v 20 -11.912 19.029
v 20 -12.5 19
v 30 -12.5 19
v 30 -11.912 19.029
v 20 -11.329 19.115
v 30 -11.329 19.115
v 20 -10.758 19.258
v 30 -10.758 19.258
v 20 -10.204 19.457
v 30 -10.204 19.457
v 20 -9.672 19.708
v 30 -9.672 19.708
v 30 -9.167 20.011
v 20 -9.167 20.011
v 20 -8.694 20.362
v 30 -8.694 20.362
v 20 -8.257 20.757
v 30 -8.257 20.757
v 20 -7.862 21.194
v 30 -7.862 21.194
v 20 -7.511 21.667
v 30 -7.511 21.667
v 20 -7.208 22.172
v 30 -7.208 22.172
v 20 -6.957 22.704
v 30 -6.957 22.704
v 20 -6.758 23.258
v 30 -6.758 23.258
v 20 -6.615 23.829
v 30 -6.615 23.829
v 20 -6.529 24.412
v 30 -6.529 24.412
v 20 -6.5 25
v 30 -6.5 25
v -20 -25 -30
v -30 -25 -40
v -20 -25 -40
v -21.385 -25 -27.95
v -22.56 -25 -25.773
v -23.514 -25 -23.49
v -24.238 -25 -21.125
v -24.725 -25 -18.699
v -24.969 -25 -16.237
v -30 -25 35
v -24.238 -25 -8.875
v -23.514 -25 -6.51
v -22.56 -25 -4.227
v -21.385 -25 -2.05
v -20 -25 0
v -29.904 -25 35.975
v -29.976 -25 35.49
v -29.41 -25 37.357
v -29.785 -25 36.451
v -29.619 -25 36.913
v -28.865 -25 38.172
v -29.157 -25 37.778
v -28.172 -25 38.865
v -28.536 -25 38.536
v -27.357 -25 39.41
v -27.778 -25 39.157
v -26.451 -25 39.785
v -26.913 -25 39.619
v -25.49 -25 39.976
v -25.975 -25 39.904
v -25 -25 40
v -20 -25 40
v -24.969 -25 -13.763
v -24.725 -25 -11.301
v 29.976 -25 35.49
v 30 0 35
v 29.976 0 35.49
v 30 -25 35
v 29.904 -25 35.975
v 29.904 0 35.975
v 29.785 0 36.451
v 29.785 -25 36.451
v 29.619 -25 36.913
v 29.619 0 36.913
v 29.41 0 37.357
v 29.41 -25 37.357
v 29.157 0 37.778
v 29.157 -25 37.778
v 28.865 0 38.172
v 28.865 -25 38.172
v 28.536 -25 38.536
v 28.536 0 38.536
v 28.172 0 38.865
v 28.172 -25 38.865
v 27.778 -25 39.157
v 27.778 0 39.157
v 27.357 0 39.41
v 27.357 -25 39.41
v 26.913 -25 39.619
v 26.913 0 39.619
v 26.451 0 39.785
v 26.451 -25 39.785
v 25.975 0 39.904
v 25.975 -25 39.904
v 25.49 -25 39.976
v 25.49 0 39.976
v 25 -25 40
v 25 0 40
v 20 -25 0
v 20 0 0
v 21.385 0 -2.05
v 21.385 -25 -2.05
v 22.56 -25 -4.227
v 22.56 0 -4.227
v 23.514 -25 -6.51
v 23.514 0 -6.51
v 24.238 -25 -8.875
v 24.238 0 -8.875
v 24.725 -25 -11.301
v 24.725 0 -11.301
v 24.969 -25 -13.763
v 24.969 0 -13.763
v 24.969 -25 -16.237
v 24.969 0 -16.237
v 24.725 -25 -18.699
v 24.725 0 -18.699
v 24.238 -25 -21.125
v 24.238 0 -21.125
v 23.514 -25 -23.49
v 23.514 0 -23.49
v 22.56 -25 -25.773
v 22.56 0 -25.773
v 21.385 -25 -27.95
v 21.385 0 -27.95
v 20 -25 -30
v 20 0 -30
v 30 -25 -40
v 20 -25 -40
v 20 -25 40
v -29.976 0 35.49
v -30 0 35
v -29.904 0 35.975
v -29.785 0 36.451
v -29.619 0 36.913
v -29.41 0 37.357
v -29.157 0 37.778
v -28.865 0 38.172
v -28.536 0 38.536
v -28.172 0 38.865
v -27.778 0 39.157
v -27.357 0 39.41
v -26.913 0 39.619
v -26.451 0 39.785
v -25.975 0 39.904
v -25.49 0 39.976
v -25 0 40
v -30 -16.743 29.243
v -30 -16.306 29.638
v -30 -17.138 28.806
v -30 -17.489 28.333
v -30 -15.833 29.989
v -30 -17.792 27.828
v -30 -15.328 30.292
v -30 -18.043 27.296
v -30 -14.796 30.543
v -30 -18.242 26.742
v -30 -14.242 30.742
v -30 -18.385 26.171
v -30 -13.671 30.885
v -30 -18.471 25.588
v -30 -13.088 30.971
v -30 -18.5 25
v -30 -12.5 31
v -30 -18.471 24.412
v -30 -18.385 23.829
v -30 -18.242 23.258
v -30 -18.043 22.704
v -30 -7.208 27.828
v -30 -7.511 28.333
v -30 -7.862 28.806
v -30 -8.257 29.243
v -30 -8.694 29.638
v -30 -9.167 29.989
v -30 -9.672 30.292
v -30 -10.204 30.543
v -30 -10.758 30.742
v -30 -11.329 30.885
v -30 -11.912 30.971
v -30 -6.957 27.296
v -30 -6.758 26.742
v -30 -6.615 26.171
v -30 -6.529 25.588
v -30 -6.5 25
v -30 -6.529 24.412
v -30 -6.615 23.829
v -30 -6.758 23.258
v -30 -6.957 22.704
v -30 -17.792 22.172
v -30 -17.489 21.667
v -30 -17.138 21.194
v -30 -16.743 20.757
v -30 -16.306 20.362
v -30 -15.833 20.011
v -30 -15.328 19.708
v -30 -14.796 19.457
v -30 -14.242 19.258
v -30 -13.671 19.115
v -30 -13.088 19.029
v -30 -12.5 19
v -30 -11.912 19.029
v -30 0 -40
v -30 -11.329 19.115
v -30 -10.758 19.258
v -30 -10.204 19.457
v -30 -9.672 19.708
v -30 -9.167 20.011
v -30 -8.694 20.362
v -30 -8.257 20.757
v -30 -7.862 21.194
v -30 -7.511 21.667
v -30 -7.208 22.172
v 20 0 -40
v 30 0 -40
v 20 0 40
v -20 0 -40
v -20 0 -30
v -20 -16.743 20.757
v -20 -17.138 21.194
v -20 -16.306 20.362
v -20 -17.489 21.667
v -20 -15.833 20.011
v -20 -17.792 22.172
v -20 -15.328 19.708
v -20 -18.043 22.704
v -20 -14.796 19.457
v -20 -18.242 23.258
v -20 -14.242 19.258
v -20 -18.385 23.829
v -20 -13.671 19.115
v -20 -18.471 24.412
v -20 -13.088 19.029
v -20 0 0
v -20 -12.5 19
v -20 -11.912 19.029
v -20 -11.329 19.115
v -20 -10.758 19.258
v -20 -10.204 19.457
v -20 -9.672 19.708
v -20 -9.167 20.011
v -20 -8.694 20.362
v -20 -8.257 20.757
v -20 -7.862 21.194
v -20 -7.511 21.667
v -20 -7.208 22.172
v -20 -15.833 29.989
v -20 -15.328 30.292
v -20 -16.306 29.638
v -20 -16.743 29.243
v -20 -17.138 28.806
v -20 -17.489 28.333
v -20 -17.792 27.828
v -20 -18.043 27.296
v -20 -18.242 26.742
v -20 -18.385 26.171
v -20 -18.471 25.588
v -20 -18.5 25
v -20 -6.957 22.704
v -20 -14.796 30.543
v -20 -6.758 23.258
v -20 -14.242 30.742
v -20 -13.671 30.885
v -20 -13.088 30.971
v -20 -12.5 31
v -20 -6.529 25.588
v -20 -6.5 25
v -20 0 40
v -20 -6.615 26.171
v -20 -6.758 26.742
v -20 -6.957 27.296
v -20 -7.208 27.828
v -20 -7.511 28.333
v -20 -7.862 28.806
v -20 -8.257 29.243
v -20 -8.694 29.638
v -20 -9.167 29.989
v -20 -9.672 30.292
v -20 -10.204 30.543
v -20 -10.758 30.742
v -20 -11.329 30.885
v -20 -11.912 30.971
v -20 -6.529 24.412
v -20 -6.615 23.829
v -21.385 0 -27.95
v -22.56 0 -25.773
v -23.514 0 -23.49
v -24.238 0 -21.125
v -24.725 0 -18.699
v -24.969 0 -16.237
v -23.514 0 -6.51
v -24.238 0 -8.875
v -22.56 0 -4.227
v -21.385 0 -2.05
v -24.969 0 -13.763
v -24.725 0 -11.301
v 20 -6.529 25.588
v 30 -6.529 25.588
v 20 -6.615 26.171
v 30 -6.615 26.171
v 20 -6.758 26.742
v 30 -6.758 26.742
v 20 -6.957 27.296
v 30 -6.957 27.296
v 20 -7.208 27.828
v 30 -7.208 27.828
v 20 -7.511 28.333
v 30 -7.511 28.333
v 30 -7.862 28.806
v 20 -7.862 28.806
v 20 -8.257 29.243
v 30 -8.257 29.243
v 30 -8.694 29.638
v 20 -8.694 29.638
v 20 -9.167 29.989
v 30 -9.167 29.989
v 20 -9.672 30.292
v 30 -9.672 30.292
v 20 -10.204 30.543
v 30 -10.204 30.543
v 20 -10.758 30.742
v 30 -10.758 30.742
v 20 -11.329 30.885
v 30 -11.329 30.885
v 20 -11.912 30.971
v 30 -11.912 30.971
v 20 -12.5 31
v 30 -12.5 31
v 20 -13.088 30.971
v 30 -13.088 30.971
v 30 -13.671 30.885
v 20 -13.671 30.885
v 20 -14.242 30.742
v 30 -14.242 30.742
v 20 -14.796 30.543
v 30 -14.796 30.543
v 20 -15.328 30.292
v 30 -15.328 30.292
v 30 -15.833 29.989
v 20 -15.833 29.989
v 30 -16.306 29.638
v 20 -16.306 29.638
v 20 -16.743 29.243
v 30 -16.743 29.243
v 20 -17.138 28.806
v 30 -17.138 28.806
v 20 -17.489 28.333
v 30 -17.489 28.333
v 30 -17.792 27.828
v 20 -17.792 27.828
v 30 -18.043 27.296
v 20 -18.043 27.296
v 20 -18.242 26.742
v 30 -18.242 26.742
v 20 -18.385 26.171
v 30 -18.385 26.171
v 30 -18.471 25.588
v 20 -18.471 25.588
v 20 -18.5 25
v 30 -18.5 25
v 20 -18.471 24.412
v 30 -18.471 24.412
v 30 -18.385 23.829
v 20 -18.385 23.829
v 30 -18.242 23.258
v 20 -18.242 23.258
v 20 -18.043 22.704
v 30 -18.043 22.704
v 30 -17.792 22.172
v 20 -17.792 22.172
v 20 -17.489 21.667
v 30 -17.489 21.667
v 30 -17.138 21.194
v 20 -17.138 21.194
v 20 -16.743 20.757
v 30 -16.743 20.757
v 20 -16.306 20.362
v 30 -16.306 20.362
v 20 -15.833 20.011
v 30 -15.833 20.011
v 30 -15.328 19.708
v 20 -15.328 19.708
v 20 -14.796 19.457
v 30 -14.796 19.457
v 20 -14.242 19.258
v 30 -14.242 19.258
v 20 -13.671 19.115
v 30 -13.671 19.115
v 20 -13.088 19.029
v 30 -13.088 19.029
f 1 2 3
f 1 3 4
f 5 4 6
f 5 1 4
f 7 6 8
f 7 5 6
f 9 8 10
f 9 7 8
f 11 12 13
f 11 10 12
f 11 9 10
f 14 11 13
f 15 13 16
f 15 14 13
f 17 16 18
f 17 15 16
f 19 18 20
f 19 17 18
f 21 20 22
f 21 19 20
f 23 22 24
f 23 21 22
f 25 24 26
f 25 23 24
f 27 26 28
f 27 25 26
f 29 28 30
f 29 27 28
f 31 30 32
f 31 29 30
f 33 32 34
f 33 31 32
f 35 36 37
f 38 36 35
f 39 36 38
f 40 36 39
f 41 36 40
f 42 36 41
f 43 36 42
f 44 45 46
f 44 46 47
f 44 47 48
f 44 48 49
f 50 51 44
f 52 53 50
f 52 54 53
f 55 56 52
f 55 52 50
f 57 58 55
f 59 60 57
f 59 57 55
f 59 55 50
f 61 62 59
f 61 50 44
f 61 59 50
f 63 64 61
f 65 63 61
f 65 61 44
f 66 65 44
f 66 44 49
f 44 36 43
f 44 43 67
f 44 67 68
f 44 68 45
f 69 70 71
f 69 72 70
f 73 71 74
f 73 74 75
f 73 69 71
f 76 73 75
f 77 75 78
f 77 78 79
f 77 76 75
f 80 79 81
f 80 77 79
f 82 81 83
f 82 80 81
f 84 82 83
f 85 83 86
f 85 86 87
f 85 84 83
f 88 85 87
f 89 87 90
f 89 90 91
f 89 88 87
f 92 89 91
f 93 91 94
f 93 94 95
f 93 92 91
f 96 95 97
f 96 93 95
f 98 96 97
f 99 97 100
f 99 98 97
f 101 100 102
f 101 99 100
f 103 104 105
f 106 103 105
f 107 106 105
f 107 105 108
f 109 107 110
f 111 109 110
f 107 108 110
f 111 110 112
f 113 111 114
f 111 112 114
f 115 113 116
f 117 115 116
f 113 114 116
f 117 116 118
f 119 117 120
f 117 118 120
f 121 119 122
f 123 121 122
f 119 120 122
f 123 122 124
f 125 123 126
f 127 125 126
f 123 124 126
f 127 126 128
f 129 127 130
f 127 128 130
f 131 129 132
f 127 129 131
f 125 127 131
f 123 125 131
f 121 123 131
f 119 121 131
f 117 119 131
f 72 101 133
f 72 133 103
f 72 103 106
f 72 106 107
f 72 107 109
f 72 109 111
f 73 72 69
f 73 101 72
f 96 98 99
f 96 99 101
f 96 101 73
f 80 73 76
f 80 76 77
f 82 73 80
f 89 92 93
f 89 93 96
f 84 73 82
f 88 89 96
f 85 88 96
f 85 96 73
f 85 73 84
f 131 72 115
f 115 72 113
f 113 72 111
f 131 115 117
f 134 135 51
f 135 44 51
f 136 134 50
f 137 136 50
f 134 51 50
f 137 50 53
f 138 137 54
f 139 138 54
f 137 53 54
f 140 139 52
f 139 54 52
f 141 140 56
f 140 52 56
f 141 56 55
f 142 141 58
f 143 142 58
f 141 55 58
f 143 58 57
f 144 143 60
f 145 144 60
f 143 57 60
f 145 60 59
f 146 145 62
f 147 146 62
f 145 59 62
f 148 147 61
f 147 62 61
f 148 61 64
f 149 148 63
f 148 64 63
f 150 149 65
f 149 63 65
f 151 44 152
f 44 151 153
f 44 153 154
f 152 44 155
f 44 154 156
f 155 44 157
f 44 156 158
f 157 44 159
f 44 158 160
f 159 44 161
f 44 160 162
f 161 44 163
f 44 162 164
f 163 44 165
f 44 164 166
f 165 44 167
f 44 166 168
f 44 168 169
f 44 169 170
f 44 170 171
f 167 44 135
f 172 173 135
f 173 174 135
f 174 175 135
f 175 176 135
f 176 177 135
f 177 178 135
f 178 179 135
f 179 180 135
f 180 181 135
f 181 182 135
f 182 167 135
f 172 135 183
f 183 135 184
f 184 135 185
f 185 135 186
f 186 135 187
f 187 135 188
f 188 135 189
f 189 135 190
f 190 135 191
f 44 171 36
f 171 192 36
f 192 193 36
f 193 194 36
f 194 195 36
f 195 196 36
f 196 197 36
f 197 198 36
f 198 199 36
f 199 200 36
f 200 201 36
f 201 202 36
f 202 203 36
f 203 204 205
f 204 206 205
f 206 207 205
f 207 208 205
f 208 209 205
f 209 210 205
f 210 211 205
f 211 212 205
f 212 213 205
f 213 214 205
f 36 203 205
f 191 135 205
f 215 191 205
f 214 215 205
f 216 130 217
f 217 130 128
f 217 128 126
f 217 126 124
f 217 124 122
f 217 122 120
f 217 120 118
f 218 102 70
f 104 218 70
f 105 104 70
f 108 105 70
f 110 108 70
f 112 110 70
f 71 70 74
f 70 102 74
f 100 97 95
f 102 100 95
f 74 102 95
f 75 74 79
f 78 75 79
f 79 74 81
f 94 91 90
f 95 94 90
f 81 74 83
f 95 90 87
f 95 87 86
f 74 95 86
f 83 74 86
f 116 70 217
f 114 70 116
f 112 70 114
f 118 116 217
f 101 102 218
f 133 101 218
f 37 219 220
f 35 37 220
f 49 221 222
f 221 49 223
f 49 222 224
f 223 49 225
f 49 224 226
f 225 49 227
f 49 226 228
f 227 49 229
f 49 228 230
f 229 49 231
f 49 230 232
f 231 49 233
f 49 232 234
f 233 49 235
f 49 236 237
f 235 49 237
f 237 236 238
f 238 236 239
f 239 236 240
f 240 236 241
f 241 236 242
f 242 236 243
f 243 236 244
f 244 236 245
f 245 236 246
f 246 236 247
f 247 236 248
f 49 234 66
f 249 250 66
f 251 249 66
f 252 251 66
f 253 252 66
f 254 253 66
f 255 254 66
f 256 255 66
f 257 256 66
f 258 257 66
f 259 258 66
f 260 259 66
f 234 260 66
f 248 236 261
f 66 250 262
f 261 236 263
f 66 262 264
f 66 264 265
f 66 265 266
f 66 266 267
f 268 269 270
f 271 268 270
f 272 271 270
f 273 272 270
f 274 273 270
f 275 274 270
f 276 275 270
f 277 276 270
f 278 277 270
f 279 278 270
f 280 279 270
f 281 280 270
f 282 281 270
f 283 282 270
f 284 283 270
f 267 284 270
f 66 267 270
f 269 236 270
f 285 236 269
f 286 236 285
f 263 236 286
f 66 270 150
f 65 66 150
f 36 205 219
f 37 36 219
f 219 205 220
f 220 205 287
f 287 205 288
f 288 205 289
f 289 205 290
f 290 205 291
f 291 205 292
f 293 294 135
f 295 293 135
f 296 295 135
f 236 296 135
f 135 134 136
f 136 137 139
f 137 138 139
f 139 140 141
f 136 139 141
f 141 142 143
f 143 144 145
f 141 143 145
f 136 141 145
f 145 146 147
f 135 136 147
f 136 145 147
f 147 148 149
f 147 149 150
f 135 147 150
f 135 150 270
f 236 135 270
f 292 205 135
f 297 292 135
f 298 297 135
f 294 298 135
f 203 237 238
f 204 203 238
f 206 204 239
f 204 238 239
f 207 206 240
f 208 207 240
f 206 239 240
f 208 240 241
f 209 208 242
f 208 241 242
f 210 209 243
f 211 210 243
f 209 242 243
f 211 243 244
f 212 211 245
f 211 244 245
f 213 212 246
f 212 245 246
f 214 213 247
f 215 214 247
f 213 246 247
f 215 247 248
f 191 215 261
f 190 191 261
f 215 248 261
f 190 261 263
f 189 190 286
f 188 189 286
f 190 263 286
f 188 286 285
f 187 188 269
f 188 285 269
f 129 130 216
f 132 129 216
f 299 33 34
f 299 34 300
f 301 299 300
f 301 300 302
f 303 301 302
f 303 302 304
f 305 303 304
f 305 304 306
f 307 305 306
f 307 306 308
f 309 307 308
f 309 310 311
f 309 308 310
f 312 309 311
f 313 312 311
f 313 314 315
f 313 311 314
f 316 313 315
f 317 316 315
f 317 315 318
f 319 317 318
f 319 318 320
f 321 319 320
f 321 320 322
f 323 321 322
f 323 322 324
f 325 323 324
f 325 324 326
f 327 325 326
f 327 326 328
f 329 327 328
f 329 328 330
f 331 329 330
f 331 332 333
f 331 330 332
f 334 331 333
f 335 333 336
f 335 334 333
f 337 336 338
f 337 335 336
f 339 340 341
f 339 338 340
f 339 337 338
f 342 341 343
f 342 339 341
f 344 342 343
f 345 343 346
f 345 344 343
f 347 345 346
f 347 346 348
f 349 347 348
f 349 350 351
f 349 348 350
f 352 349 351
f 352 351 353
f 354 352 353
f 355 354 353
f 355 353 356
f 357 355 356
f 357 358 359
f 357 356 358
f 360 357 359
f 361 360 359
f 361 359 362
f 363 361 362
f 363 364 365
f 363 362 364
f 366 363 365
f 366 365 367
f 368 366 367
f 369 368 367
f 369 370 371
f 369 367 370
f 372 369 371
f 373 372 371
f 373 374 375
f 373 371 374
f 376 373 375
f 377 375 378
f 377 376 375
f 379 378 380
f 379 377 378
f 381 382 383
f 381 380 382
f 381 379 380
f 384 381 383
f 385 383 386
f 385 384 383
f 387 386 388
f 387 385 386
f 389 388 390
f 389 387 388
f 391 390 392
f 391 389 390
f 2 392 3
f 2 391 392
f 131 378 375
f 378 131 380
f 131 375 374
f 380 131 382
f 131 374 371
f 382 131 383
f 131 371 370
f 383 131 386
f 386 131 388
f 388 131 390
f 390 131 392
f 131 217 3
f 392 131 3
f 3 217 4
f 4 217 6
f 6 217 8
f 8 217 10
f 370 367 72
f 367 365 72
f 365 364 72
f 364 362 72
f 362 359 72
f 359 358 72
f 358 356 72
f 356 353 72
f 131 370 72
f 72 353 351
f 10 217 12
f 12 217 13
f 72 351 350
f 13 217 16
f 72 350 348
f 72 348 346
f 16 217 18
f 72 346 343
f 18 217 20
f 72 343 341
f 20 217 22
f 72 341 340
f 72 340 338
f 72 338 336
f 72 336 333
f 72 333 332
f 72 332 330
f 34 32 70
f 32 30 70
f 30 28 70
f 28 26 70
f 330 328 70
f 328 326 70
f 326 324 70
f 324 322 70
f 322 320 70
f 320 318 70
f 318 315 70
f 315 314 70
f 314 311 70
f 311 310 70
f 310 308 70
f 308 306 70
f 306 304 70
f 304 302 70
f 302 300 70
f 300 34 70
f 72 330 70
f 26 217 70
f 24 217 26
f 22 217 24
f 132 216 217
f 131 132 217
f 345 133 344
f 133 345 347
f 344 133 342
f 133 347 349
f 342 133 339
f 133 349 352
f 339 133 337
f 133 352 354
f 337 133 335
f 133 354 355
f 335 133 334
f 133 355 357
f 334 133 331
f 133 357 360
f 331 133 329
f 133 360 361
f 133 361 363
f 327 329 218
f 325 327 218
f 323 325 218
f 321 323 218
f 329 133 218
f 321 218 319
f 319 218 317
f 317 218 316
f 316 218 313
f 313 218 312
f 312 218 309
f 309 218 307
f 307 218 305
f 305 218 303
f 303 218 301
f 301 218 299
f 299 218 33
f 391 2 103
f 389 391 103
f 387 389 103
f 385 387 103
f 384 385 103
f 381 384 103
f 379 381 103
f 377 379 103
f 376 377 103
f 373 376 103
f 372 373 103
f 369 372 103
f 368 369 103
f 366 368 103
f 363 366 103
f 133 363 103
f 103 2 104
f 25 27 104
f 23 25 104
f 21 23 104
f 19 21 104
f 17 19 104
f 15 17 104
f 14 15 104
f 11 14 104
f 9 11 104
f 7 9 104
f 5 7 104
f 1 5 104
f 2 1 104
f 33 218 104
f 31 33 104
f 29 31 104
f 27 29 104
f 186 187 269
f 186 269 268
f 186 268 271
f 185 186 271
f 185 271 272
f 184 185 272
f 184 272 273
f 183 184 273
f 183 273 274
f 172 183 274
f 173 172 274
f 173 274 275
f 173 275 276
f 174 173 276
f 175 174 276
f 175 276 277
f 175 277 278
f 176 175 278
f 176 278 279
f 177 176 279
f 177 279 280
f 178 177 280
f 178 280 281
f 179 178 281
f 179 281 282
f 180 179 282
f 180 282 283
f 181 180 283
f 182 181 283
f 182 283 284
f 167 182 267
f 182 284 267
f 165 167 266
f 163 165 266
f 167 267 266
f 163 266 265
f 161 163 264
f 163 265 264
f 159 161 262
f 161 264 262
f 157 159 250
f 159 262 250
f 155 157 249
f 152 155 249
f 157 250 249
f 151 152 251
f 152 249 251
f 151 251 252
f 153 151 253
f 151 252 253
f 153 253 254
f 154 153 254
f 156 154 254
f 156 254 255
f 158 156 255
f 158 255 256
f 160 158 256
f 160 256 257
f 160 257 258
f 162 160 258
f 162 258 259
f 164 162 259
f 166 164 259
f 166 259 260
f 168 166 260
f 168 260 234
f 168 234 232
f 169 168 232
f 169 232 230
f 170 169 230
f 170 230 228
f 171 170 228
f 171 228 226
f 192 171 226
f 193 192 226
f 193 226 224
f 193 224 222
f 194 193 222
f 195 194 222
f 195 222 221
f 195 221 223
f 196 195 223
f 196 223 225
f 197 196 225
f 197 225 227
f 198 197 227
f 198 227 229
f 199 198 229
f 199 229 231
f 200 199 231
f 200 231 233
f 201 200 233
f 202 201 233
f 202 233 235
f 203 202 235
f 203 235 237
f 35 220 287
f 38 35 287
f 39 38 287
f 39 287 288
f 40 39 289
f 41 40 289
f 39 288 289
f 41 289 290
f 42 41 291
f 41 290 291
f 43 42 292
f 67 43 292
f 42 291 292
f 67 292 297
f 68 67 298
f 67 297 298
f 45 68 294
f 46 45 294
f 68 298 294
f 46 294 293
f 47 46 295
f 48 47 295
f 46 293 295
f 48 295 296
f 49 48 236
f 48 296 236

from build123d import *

# Parameters (mm, degrees)
F1_DEPTH      = 25
F3_DEPTH      = 50
F3_DEPTH_BACK = 30
F4_DEPTH      = 30
F5_R          = 5


with BuildPart() as f1:
    # F0 (on Front) → F1 (new body)
    with BuildSketch(Plane.XZ):
        with BuildLine():
            Line((-30, 40), (-30, -40))
            Line((-30, -40), (-20, -40))
            Line((-20, -40), (-20, -30))
            ThreePointArc((-20, -30), (-25, -15), (-20, 0))
            Line((-20, 0), (-20, 40))
            Line((-20, 40), (-30, 40))
        make_face()
        with BuildLine():
            Line((20, -40), (30, -40))
            Line((30, -40), (30, 40))
            Line((30, 40), (20, 40))
            Line((20, 40), (20, 0))
            ThreePointArc((20, 0), (25, -15), (20, -30))
            Line((20, -30), (20, -40))
        make_face()
    extrude(amount=F1_DEPTH)

    # F2 (on Right) → F3 (cut, two sides)
    with BuildSketch(Plane.YZ) as f3_sk:
        with BuildLine():
            ThreePointArc((-12.5, 19), (-8.257359, 20.757359), (-6.5, 25))
            ThreePointArc((-6.5, 25), (-16.742641, 29.242641), (-12.5, 19))
        make_face()
    extrude(amount=F3_DEPTH, mode=Mode.SUBTRACT)
    extrude(f3_sk.sketch, amount=-F3_DEPTH_BACK, mode=Mode.SUBTRACT)

    # F2 (on Right) → F4 (cut)
    with BuildSketch(Plane.YZ):
        with BuildLine():
            ThreePointArc((-12.5, 19), (-8.257359, 20.757359), (-6.5, 25))
            ThreePointArc((-6.5, 25), (-16.742641, 29.242641), (-12.5, 19))
        make_face()
    extrude(amount=-F4_DEPTH, mode=Mode.SUBTRACT)

    # F5
    f5_edges = [f1.edges().sort_by_distance(p)[0] for p in [
        (30, -12.5, 40),
        (-30, -12.5, 40),
    ]]
    fillet(f5_edges, radius=F5_R)


solid = f1.part
